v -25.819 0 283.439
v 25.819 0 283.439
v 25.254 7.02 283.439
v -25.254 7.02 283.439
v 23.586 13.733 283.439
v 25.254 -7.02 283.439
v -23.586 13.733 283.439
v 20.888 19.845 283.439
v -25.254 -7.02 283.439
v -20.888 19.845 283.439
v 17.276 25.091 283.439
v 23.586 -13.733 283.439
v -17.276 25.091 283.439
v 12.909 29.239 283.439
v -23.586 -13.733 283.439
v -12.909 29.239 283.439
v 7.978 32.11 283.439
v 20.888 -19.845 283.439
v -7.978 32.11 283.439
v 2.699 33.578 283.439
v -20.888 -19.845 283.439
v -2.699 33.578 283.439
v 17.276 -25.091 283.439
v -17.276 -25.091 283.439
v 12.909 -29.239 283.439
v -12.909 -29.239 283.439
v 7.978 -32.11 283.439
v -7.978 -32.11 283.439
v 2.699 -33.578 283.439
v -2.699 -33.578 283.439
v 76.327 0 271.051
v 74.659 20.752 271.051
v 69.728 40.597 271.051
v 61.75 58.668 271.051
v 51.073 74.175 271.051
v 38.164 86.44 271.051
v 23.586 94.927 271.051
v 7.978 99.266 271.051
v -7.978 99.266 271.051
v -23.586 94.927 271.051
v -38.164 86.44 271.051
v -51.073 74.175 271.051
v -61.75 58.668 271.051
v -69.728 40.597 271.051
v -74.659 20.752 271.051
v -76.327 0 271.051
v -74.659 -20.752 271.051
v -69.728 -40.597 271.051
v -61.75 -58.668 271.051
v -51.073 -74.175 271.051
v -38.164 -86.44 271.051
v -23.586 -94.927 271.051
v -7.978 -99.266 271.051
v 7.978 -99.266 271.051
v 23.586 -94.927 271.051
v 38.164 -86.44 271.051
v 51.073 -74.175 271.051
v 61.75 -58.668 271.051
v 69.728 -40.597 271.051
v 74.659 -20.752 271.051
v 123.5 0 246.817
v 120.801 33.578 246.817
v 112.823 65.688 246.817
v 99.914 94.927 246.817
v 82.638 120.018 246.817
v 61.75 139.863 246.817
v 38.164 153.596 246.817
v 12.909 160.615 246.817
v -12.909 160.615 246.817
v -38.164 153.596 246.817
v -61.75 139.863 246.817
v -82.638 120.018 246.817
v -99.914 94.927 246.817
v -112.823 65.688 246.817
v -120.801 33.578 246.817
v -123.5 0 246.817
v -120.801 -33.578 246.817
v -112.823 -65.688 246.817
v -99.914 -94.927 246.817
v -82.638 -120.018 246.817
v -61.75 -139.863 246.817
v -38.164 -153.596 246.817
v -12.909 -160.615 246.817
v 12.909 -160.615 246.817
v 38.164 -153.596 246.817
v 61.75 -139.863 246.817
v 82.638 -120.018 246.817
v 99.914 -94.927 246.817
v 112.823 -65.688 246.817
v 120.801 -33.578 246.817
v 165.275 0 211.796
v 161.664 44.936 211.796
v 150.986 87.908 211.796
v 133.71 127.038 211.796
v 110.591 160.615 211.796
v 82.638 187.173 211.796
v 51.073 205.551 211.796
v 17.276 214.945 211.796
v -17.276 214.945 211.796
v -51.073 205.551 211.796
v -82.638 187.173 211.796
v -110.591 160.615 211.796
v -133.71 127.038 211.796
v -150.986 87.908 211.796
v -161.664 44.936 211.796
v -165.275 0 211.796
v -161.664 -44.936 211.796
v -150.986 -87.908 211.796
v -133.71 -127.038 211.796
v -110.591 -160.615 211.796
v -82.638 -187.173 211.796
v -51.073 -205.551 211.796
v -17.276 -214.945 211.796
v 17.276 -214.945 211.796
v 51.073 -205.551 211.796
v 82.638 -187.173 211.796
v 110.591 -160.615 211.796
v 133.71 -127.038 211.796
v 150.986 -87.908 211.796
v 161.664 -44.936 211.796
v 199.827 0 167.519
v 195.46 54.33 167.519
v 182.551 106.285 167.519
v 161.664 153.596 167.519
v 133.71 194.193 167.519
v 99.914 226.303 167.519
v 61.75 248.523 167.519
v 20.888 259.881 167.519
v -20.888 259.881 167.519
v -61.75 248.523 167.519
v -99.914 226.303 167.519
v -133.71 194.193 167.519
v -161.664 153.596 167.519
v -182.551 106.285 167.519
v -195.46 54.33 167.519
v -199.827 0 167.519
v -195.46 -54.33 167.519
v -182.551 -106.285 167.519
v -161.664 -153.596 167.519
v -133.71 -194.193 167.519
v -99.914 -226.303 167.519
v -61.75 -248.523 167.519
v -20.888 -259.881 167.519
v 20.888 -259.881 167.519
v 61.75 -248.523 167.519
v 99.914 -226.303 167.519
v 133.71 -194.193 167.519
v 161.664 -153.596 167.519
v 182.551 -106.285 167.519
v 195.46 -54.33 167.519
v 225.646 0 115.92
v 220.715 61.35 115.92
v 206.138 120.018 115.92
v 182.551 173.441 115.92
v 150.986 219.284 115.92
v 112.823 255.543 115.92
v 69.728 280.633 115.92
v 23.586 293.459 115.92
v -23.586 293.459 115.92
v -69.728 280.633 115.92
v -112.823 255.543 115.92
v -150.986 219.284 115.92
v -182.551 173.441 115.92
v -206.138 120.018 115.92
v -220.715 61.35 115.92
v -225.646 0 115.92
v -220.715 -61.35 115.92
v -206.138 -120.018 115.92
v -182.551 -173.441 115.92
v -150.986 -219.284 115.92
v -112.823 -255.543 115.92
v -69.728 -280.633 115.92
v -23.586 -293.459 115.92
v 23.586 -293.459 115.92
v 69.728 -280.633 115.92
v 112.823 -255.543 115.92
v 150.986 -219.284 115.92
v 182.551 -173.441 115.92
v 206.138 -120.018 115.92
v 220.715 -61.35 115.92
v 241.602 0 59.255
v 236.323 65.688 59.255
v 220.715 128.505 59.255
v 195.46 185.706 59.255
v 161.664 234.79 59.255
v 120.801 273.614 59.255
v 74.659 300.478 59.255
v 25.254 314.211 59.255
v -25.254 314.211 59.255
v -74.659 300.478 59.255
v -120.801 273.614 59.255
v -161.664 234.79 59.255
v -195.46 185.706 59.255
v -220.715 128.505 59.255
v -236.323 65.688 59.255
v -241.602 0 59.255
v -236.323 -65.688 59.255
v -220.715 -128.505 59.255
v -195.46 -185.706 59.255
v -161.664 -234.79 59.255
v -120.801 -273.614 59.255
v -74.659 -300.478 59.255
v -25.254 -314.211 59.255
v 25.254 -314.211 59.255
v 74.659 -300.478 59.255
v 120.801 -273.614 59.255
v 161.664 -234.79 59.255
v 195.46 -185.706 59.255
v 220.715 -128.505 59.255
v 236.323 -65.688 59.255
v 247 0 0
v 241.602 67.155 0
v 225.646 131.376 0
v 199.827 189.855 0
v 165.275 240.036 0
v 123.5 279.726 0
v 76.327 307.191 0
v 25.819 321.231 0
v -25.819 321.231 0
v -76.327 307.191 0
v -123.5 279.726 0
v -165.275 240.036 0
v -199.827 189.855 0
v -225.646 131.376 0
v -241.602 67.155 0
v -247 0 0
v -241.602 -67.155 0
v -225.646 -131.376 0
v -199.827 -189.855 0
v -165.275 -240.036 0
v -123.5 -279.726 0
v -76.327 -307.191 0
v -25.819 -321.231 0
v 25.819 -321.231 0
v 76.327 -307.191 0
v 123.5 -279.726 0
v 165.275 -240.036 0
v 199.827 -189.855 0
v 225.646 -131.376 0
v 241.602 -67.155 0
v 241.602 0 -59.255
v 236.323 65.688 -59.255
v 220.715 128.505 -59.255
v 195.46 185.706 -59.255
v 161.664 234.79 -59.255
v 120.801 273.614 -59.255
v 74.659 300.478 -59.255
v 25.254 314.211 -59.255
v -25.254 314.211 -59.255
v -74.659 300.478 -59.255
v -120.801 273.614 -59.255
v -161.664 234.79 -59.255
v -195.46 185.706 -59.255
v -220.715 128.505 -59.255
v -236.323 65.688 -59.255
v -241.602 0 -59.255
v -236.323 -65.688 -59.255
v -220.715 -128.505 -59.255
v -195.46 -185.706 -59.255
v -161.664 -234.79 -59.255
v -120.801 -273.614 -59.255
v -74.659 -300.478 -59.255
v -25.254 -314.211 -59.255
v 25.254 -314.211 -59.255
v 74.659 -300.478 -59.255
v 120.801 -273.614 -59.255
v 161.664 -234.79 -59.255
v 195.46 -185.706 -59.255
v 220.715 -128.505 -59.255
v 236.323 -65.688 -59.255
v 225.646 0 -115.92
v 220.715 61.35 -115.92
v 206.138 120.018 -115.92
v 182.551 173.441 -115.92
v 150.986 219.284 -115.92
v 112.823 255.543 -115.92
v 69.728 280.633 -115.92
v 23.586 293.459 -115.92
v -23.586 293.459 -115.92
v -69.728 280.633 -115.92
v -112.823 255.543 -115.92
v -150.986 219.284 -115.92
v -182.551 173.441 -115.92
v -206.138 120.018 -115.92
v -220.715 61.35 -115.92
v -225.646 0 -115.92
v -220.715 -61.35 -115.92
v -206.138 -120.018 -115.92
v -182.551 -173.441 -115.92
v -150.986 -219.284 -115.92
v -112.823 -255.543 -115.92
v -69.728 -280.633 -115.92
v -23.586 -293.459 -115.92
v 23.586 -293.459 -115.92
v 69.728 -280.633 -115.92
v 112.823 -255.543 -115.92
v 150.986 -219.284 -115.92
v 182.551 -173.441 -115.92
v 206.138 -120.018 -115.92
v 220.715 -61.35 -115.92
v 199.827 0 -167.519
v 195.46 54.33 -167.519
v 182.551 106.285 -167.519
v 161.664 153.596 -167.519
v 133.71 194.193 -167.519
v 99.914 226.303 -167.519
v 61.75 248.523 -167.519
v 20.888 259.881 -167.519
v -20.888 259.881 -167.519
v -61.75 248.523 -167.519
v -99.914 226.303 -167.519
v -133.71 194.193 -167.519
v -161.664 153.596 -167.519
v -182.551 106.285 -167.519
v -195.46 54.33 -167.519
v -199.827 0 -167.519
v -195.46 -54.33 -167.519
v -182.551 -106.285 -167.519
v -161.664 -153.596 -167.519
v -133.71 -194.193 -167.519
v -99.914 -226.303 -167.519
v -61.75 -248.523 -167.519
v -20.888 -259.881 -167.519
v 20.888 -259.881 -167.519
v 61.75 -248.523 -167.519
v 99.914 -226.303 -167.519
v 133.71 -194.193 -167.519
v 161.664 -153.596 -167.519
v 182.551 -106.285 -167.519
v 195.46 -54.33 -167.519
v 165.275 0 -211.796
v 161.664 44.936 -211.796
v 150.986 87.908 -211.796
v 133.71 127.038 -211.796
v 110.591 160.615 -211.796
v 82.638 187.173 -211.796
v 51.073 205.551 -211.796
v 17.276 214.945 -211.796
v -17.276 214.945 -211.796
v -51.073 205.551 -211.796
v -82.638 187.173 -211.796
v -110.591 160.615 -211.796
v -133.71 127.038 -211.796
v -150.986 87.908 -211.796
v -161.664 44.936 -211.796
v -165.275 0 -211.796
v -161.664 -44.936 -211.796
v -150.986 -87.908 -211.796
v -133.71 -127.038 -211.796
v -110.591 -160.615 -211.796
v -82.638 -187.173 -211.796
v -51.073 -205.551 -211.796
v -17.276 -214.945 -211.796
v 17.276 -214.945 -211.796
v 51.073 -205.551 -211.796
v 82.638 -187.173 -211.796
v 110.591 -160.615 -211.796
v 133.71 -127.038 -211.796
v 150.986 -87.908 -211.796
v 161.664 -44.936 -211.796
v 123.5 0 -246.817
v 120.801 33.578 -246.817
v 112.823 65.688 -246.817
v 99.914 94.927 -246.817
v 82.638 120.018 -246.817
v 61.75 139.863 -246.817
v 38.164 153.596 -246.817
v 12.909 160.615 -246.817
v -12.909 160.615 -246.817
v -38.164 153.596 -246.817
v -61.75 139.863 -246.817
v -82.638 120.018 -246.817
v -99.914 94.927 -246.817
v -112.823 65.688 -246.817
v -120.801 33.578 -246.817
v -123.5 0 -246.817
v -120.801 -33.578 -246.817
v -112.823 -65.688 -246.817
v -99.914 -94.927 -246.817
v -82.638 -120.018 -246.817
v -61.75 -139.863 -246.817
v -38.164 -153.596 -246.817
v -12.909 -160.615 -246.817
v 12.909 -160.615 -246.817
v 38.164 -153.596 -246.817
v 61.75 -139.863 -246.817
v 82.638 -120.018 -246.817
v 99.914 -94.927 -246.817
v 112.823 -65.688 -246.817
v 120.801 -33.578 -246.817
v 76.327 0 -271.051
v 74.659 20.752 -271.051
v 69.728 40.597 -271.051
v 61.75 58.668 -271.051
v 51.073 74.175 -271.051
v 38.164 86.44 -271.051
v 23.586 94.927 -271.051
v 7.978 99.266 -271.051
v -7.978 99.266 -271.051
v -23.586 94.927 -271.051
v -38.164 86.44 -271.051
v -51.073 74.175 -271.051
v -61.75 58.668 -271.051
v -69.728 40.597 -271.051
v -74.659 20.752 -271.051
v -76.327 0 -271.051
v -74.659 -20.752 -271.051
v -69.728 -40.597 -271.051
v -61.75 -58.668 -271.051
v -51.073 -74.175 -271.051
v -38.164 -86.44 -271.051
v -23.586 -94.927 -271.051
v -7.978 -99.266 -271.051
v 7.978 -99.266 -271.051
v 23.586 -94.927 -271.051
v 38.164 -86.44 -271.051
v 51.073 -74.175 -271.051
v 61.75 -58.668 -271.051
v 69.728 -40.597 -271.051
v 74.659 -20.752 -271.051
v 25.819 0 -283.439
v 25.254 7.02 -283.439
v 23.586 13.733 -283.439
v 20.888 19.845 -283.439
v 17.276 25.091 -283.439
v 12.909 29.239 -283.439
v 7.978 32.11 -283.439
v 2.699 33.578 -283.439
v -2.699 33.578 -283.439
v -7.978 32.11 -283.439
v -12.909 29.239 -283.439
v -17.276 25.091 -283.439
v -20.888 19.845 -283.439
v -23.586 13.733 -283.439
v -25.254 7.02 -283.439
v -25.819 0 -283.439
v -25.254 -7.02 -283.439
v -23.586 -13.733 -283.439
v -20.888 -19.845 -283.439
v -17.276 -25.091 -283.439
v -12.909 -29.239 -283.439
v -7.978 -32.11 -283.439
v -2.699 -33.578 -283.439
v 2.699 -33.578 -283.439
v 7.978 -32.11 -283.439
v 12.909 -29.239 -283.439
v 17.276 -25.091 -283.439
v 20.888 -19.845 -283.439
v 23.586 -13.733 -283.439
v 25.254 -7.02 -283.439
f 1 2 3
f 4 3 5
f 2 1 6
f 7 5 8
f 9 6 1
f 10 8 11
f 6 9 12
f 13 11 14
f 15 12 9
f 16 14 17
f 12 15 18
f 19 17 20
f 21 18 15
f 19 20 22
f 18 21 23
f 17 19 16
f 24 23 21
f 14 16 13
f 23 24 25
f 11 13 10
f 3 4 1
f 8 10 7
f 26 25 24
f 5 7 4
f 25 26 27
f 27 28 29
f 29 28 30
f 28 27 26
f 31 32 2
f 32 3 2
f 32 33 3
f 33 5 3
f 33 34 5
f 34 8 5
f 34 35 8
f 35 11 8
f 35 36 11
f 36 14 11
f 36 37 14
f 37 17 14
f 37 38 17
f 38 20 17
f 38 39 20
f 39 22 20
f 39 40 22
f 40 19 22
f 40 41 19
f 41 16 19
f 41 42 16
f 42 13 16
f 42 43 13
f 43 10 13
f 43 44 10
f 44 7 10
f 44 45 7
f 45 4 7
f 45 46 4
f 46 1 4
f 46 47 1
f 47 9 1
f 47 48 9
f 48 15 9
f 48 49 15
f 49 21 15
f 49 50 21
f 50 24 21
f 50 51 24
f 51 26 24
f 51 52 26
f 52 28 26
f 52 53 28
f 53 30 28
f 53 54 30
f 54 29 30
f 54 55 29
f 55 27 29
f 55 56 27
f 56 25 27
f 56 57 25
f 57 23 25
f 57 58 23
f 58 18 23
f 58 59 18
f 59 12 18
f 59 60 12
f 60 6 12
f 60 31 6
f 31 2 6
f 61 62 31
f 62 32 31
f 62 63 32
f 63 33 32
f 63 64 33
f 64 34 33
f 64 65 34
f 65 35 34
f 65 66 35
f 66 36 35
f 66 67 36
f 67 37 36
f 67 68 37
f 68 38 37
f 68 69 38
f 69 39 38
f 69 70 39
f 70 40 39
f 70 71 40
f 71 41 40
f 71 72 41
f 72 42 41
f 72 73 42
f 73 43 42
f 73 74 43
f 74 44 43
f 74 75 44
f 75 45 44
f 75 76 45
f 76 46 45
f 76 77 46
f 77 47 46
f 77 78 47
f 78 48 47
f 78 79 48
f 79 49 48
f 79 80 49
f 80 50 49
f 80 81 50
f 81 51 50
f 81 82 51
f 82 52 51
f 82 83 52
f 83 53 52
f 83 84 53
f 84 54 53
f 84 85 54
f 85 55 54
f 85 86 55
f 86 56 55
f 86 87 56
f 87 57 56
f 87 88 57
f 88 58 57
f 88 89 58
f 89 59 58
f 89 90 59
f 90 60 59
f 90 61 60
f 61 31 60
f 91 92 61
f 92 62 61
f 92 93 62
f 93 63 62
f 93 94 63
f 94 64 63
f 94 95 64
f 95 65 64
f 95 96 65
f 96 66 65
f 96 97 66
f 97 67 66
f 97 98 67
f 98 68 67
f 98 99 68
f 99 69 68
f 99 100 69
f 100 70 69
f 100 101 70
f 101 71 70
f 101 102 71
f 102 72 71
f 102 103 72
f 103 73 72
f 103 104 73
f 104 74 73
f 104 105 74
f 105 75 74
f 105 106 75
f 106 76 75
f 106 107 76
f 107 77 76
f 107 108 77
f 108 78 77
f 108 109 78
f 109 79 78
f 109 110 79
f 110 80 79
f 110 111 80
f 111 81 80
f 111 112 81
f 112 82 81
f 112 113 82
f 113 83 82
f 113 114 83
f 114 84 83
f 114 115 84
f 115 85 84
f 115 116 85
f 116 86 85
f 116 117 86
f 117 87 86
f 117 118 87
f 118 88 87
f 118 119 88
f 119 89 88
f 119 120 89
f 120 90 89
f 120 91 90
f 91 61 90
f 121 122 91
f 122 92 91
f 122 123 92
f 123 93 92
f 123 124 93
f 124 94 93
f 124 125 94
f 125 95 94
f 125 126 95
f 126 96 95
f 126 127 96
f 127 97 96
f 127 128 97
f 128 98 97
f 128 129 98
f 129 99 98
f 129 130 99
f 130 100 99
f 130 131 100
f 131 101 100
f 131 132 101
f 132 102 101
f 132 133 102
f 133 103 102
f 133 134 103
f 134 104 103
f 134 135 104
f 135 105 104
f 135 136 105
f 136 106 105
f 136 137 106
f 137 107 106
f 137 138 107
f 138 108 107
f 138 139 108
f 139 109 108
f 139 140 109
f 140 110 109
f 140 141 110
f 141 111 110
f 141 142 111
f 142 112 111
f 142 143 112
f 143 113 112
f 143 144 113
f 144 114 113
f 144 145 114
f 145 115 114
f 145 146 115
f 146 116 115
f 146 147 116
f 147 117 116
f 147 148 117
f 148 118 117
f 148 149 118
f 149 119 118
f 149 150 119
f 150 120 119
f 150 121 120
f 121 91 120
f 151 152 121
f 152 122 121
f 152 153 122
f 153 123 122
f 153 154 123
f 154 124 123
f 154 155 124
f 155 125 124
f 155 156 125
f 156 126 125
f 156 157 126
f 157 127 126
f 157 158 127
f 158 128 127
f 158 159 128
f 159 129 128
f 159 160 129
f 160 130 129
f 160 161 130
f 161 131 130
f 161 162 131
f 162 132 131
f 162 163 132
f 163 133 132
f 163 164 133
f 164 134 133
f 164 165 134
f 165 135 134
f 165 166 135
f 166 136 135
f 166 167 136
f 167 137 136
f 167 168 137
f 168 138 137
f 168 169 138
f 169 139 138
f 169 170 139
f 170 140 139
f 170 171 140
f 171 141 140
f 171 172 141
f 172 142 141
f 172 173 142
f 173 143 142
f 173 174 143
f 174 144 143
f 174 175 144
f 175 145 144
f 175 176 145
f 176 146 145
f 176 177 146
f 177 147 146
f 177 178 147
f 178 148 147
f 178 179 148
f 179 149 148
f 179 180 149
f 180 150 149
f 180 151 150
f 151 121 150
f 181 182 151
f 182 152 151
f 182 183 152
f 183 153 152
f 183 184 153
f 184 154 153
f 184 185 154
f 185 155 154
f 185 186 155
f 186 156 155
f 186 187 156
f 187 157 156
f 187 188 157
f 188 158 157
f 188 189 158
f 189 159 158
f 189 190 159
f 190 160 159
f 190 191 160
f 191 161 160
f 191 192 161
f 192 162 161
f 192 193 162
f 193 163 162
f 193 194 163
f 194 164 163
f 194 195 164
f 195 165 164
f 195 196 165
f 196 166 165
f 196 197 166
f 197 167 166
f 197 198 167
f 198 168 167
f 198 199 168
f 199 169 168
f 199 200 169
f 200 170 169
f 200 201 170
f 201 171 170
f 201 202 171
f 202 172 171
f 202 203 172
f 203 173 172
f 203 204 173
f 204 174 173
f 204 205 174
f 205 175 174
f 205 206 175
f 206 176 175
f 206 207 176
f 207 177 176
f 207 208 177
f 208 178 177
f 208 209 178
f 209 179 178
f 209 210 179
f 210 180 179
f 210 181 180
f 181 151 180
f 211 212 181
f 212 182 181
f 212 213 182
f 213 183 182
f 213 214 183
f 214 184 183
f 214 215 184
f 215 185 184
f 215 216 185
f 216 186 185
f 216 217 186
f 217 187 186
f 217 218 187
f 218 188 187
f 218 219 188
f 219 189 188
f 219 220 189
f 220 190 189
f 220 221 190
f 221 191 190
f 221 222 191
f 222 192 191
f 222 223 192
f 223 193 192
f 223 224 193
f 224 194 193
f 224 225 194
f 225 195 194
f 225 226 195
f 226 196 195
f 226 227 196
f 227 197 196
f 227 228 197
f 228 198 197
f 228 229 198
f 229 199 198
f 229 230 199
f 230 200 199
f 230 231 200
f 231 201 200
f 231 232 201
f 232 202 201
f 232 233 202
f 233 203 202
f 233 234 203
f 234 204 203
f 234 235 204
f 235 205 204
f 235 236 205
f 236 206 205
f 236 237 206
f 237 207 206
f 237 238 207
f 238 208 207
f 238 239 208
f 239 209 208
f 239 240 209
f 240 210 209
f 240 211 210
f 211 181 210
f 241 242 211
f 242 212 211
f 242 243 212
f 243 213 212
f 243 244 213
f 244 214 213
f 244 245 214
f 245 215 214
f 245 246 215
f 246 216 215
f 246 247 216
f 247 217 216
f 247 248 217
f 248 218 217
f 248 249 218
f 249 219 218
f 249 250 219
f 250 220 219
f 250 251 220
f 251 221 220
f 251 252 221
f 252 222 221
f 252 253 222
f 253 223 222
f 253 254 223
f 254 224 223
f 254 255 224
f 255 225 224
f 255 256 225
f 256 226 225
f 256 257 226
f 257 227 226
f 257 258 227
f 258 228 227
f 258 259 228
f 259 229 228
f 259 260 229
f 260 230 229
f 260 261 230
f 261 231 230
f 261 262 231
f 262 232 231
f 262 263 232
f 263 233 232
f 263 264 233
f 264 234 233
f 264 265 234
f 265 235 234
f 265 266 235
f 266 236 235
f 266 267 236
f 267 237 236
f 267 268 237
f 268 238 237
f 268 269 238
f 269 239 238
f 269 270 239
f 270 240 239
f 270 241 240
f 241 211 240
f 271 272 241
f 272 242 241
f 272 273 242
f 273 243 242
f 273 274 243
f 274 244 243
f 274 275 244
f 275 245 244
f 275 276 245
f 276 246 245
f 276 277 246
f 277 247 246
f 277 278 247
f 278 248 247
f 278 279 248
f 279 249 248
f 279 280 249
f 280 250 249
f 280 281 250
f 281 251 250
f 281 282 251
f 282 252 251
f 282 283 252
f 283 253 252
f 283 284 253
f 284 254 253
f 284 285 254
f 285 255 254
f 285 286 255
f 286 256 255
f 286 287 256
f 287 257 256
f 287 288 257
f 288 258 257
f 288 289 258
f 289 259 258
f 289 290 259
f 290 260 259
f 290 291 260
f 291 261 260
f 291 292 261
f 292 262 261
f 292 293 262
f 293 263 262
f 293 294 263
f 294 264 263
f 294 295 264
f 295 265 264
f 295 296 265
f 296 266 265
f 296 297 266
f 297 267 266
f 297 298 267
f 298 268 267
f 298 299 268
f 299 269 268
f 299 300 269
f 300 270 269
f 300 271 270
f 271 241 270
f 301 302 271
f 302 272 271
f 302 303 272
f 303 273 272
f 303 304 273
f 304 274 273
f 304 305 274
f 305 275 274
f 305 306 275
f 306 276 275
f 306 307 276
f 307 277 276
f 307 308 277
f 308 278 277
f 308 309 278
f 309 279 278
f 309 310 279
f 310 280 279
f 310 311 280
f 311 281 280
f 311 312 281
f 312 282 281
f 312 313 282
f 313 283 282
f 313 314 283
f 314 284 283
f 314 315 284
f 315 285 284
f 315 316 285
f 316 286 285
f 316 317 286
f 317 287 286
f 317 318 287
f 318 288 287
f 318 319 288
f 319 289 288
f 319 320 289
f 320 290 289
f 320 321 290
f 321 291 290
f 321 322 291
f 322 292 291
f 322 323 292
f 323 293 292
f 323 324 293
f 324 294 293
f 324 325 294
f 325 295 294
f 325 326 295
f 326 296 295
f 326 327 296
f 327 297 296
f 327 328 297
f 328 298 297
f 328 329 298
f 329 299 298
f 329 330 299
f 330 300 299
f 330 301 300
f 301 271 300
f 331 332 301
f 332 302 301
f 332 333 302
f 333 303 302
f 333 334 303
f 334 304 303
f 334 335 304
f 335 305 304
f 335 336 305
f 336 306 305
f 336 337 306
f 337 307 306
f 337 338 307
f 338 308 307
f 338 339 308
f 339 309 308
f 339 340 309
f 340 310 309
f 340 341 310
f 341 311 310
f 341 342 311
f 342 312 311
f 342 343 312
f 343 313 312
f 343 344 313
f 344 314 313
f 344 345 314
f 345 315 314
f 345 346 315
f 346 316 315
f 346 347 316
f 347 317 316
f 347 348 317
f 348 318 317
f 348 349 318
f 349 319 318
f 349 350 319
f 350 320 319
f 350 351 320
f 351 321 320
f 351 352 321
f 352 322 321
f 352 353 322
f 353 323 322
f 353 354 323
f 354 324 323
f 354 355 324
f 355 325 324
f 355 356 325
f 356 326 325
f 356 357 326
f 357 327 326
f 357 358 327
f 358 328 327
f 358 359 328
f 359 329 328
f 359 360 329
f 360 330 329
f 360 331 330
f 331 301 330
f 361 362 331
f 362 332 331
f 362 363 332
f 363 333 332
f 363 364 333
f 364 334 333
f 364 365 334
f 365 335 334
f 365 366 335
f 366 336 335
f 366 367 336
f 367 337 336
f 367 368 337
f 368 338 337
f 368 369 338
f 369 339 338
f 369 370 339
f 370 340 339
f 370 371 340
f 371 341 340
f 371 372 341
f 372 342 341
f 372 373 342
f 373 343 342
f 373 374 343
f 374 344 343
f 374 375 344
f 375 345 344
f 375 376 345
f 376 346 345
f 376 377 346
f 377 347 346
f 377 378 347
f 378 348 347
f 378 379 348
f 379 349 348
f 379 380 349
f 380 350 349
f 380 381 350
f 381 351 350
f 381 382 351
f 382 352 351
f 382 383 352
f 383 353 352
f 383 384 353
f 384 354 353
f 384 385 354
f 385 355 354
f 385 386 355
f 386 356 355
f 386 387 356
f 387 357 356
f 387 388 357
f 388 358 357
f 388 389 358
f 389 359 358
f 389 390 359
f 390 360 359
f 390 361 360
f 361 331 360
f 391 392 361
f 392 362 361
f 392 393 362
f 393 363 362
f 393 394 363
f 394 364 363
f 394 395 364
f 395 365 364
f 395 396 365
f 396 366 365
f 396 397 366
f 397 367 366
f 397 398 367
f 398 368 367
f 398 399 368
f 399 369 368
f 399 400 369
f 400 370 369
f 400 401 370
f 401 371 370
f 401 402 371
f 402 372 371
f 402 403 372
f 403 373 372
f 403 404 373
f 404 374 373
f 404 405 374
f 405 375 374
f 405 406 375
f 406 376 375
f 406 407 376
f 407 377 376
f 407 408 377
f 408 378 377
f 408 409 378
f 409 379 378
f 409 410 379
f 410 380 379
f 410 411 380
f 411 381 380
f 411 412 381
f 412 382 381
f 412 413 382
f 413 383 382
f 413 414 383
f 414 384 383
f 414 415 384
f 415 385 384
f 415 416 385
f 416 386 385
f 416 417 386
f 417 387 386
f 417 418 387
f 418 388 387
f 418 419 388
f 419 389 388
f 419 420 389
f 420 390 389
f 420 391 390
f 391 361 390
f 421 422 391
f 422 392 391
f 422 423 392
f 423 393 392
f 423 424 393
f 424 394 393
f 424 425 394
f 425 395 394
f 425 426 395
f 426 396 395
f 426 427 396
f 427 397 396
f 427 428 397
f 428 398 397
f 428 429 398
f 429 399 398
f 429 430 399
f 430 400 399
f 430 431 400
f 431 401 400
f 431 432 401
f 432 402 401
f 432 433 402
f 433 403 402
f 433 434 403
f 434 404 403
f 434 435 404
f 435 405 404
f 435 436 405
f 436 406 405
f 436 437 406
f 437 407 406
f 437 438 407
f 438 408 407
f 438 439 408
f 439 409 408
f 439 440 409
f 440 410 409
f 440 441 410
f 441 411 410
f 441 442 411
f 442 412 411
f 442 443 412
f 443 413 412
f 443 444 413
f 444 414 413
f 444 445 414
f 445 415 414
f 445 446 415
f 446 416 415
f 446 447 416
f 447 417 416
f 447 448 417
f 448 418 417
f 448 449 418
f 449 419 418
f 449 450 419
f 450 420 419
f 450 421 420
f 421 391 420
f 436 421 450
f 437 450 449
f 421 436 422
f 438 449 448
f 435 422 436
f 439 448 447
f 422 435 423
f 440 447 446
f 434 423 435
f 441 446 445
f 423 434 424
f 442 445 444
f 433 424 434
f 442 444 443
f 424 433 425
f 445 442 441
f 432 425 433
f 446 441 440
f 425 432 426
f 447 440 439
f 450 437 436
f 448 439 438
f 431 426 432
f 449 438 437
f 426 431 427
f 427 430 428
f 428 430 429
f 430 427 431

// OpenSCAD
// Generated by SolidPython 1.0.1 on 2020-07-29 00:46:51


scale(v = [13, 17, 15]) {
	sphere(r = 19);
}
/***********************************************
*********      SolidPython code:      **********
************************************************
 
# import packages: SolidPython
from solid import *
from solid.utils import *
from itertools import chain, combinations, permutations


class Resize:

    def __init__(self, scad_file):
        self.scad_file = scad_file
        #self.scad_file = import_scad(scad_file)
        # cone/cylinder param:
        self.r1 = 0
        self.r2 = 0
        self.h = 0
        # rectangular prism param:
        self.w = 0
        self.l = 0
        # ellipse param:
        self.r = 0

    # import OpenScad code (file name corresponds to shape)


    # classify shape + parameters
    def assign(self, param1, param2, param3):
        if self.scad_file == 'cone.scad':
            self.r1 = param1
            self.r2 = param2
            self.h = param3
        elif self.scad_file == 'cylinder.scad':
            self.r1 = param1
            self.r2 = param2
            self.h = param3
        elif self.scad_file == 'rectangularPrism.scad':
            self.h = param1
            self.l = param2
            self.w = param3
        else:
            self.r = param1
            self.h = param2

    # resize parameters
    def iterate(self):
        x = range(3, 20, 2)
        i = 1
        if self.scad_file == 'cone.scad':
            tempList = list(permutations(x, 2))
            for temp in tempList:
                param1 = temp[0]
                param2 = temp[1]
                filepath = 'produced_scad_files/' + 'cone' + str(param1) + '_' + str(param2) + '_' + '.scad'
                scad_render_to_file(cylinder(h=param1, r1=param2, r2=0), filepath)

        elif self.scad_file == 'cylinder.scad':
            tempList = list(permutations(x, 3))
            for temp in tempList:
                param1 = temp[0]
                param2 = temp[1]
                filepath = 'produced_scad_files/' + 'cylinder' + str(param1) + '_' + str(param2) + '_' + '.scad'
                scad_render_to_file(cylinder(h=param1, r1=param2, r2=param2), filepath)

        elif self.scad_file == 'rectangularPrism.scad':
            tempList = list(permutations(x, 3))
            for temp in tempList:
                param1 = temp[0]
                param2 = temp[1]
                param3 = temp[2]
                filepath = 'produced_scad_files/' + 'rectangularPrism' + str(param1) + '_' + str(param2) + '_' + str(
                    param3) + '.scad'
                scad_render_to_file(cube(size=(param1, param2, param3)), filepath)

        elif self.scad_file == 'ellipse.scad':
            tempList = list(permutations(x, 4))
            for temp in tempList:
                param1 = temp[0]
                param2 = temp[1]
                param3 = temp[2]
                param4 = temp[3]
                filepath = 'produced_scad_files/' + 'ellipse' + str(param1) + '_' + str(param2) + '_' + str(param3) + '_' + str(param4) + '.scad'
                scad_render_to_file(scale([param1, param2, param3])(sphere(r=param4)), filepath)

    def render_to_scadfile(self):
        scad_render_to_file(scad, 'example.scad') 
 
************************************************/
